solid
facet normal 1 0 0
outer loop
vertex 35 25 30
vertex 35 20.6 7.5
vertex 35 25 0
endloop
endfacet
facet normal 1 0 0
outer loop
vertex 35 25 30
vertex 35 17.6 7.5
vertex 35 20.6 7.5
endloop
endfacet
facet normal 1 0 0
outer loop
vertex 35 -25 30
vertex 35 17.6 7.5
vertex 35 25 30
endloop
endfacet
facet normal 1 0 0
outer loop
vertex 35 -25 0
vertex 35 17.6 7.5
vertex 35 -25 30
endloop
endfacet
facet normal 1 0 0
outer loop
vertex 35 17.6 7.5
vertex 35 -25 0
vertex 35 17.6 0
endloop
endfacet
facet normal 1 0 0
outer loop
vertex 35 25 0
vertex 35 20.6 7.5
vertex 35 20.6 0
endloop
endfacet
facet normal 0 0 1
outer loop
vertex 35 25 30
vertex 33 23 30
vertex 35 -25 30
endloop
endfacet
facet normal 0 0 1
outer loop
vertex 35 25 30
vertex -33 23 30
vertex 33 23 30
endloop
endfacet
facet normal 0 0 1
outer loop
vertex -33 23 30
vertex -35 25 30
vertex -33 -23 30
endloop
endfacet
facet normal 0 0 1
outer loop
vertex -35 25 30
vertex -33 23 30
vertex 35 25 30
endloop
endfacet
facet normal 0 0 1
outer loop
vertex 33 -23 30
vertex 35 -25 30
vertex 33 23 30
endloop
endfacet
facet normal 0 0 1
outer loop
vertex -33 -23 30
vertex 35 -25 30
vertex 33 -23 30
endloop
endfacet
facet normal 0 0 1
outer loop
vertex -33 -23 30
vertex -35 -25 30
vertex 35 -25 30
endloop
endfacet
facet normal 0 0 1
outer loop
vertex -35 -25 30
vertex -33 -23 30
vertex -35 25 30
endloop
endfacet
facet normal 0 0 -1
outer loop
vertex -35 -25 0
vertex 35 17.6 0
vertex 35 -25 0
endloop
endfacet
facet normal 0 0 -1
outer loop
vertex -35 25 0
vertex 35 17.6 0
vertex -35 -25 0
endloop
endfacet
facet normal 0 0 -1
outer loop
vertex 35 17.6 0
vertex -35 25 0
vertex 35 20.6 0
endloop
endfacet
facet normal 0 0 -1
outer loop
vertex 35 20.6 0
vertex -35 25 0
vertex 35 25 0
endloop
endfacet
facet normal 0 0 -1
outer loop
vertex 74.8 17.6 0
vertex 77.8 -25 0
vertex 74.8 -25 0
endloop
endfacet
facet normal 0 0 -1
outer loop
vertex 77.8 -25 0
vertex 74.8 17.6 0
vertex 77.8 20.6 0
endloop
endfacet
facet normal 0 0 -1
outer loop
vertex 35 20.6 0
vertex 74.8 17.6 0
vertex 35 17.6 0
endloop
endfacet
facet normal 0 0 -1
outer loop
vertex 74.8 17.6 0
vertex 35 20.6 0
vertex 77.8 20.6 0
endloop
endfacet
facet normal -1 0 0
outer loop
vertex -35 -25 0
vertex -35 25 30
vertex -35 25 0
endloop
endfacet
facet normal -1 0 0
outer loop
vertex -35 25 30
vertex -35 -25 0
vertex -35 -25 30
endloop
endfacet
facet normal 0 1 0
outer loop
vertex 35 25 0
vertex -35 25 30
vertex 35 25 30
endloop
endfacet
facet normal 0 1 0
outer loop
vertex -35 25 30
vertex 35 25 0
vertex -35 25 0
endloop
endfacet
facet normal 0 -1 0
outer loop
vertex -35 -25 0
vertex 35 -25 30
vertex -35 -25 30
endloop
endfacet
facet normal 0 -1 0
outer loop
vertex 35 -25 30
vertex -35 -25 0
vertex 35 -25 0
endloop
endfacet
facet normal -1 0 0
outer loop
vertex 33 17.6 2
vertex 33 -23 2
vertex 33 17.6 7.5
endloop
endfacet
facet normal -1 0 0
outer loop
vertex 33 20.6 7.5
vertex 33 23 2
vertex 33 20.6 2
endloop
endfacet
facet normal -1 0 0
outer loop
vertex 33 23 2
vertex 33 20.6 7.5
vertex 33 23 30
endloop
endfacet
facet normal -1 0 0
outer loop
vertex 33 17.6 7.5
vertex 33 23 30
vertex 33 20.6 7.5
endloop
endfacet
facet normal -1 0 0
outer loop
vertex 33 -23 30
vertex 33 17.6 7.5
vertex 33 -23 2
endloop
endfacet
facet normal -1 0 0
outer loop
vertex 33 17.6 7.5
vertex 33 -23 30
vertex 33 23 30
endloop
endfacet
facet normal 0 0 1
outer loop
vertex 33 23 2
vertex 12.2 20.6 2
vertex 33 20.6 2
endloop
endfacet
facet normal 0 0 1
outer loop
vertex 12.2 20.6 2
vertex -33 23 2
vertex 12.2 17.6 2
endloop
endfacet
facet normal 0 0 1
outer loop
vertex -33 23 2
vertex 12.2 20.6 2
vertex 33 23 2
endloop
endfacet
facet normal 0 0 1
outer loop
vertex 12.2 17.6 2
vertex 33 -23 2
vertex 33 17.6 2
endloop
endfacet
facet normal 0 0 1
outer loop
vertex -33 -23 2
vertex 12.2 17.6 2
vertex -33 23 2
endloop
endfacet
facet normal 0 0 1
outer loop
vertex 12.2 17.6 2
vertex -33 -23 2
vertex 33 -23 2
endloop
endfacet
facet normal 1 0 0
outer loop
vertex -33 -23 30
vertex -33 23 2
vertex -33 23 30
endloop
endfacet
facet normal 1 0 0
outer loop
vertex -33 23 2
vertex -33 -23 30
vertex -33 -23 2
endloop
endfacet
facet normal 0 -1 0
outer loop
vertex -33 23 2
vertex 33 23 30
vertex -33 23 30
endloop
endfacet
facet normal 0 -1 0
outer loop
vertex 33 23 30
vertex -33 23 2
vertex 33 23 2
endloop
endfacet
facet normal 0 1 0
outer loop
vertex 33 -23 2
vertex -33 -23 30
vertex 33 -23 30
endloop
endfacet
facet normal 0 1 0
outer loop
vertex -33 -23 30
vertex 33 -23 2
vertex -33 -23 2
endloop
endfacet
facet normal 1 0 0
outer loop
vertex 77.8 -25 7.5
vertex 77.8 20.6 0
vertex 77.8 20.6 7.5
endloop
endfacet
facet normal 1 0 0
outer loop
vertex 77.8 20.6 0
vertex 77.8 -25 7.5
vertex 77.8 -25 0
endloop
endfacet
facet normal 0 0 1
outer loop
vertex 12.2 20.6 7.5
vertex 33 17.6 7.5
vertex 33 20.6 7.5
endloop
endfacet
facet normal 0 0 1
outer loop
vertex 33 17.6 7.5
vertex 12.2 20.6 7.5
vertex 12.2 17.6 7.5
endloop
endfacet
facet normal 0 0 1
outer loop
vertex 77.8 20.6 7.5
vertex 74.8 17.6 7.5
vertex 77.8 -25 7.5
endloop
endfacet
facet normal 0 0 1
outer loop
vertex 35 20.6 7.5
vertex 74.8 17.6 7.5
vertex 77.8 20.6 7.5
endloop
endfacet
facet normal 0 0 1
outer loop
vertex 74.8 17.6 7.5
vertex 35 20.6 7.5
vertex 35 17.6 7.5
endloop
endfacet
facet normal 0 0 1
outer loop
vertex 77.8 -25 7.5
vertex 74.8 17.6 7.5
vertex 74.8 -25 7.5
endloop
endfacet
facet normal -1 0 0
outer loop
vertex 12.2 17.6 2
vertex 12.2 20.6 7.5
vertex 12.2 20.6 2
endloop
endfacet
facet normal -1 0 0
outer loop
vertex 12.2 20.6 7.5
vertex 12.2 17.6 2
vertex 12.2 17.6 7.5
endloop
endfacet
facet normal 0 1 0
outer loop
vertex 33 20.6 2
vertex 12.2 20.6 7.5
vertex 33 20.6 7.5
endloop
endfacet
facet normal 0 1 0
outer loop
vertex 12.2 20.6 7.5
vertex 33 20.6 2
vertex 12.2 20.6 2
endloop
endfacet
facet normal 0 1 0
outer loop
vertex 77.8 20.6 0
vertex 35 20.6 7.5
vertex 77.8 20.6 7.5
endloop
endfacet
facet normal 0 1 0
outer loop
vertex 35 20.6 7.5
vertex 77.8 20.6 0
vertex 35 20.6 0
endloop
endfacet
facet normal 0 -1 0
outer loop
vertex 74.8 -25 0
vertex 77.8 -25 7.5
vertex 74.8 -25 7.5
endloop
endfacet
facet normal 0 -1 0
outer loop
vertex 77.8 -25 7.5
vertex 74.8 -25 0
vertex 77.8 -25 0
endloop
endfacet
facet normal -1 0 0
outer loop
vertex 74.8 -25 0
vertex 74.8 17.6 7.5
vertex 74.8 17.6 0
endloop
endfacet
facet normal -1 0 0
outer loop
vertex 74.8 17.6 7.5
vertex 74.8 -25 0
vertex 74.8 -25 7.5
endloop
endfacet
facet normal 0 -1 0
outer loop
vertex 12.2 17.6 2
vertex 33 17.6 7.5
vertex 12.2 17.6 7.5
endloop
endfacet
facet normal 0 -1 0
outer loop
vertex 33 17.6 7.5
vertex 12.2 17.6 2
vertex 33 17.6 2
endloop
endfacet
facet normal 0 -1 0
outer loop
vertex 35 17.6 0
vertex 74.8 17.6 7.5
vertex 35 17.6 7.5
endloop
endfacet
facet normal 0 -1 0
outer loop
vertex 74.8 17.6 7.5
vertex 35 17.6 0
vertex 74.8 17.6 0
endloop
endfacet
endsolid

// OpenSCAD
// Two-part enclosure for electronics board
// Part 1: Box (left)
// Part 2: Lid (right, printed upside down)
// Prints together with a 10mm gap.

$fn = 64;

// --- Dimensions ---

// Box Dimensions (Outer)
BOX_X = 70;
BOX_Y = 50;
BOX_Z = 30;

// Wall and Floor Thickness
WALL_THICKNESS = 2;
FLOOR_THICKNESS = 2;

// Gap between parts
PART_GAP = 10;

// Lid Dimensions
// Plate thickness
LID_PLATE_THICKNESS = 2;
// Lip thickness (wall of the lip)
LIP_THICKNESS = 1.5;
// Lip height (extends above plate)
LIP_HEIGHT = 4;

// Lip Outer Size (as measured)
LIP_X_OUTER = 65.6;
LIP_Y_OUTER = 45.6;

// Clearance (Note: Based on provided numbers, the fit is loose)
CLEARANCE = 0.2;

// --- Calculated Internal Dimensions ---

// Box Internal Width (X)
BOX_X_INNER = BOX_X - (WALL_THICKNESS * 2);
// Box Internal Depth (Y)
BOX_Y_INNER = BOX_Y - (WALL_THICKNESS * 2);
// Box Internal Height (Z)
BOX_Z_INNER = BOX_Z - FLOOR_THICKNESS;

// Lip Inner Size (calculated from outer and thickness)
// Lip Inner X = Lip Outer X - 2 * Lip Thickness
LIP_X_INNER = LIP_X_OUTER - (LIP_THICKNESS * 2);
// Lip Inner Y = Lip Outer Y - 2 * Lip Thickness
LIP_Y_INNER = LIP_Y_OUTER - (LIP_THICKNESS * 2);

// --- Positioning ---

// Box Position: Centered on origin in X/Y, resting on Z=0.
// X range: -35 to +35.
// Y range: -25 to +25.
// Z range: 0 to 30.

// Lid Position: On the +X side of the box.
// Gap = 10mm.
// Box right face is at X = 35.
// Lid left face should be at X = 35 + 10 = 45.
// Lid Width (X) = LIP_X_OUTER = 65.6.
// Lid X range: 45 to 45 + 65.6 = 110.6.
// Lid Center X = (45 + 110.6) / 2 = 77.8.
// Lid Y range: Same as box (-25 to +25) to align with the opening.
// Lid Z range: Since it's printed upside down (plate on bed), Z goes from 0 to 2 (plate) + 1.5 (lip) + 4 (lip height) = 7.5.

// --- Part 1: Box ---
// Constructed by subtracting inner void from outer block.
// Outer block: 70 x 50 x 30.
// Inner void: (70-4) x (50-4) x (30-2) = 66 x 46 x 28.
// Void starts at Z=2 (floor thickness).

translate([-BOX_X/2, -BOX_Y/2, 0])
difference() {
    // Outer Shell
    cube([BOX_X, BOX_Y, BOX_Z]);
    
    // Inner Void
    translate([WALL_THICKNESS, WALL_THICKNESS, FLOOR_THICKNESS])
    cube([BOX_X_INNER, BOX_Y_INNER, BOX_Z_INNER]);
}

// --- Part 2: Lid ---
// Constructed as a plate with a lip.
// Total height = Plate(2) + Lip(1.5 + 4) = 7.5
// Total width = Lip Outer X = 65.6
// Total depth = Lip Outer Y = 45.6

translate([
    -LIP_X_OUTER/2 + PART_GAP + BOX_X/2, // Center X calculation
    -BOX_Y/2,                             // Center Y (aligned with box)
    0                                     // Z=0 (plate on bed)
])
difference() {
    // Main Body (Plate + Lip combined as one block)
    // Dimensions: Lip Outer X x Lip Outer Y x (Plate + Lip Wall + Lip Height)
    cube([LIP_X_OUTER, LIP_Y_OUTER, LID_PLATE_THICKNESS + LIP_THICKNESS + LIP_HEIGHT]);
    
    // Cut the hole for the electronics
    // The hole goes through the plate and into the lip.
    // Hole size = Lip Inner Size
    // Hole position: Centered on the lip block.
    translate([0, 0, 0])
    cube([LIP_X_INNER, LIP_Y_INNER, LID_PLATE_THICKNESS + LIP_THICKNESS + LIP_HEIGHT]);
}
